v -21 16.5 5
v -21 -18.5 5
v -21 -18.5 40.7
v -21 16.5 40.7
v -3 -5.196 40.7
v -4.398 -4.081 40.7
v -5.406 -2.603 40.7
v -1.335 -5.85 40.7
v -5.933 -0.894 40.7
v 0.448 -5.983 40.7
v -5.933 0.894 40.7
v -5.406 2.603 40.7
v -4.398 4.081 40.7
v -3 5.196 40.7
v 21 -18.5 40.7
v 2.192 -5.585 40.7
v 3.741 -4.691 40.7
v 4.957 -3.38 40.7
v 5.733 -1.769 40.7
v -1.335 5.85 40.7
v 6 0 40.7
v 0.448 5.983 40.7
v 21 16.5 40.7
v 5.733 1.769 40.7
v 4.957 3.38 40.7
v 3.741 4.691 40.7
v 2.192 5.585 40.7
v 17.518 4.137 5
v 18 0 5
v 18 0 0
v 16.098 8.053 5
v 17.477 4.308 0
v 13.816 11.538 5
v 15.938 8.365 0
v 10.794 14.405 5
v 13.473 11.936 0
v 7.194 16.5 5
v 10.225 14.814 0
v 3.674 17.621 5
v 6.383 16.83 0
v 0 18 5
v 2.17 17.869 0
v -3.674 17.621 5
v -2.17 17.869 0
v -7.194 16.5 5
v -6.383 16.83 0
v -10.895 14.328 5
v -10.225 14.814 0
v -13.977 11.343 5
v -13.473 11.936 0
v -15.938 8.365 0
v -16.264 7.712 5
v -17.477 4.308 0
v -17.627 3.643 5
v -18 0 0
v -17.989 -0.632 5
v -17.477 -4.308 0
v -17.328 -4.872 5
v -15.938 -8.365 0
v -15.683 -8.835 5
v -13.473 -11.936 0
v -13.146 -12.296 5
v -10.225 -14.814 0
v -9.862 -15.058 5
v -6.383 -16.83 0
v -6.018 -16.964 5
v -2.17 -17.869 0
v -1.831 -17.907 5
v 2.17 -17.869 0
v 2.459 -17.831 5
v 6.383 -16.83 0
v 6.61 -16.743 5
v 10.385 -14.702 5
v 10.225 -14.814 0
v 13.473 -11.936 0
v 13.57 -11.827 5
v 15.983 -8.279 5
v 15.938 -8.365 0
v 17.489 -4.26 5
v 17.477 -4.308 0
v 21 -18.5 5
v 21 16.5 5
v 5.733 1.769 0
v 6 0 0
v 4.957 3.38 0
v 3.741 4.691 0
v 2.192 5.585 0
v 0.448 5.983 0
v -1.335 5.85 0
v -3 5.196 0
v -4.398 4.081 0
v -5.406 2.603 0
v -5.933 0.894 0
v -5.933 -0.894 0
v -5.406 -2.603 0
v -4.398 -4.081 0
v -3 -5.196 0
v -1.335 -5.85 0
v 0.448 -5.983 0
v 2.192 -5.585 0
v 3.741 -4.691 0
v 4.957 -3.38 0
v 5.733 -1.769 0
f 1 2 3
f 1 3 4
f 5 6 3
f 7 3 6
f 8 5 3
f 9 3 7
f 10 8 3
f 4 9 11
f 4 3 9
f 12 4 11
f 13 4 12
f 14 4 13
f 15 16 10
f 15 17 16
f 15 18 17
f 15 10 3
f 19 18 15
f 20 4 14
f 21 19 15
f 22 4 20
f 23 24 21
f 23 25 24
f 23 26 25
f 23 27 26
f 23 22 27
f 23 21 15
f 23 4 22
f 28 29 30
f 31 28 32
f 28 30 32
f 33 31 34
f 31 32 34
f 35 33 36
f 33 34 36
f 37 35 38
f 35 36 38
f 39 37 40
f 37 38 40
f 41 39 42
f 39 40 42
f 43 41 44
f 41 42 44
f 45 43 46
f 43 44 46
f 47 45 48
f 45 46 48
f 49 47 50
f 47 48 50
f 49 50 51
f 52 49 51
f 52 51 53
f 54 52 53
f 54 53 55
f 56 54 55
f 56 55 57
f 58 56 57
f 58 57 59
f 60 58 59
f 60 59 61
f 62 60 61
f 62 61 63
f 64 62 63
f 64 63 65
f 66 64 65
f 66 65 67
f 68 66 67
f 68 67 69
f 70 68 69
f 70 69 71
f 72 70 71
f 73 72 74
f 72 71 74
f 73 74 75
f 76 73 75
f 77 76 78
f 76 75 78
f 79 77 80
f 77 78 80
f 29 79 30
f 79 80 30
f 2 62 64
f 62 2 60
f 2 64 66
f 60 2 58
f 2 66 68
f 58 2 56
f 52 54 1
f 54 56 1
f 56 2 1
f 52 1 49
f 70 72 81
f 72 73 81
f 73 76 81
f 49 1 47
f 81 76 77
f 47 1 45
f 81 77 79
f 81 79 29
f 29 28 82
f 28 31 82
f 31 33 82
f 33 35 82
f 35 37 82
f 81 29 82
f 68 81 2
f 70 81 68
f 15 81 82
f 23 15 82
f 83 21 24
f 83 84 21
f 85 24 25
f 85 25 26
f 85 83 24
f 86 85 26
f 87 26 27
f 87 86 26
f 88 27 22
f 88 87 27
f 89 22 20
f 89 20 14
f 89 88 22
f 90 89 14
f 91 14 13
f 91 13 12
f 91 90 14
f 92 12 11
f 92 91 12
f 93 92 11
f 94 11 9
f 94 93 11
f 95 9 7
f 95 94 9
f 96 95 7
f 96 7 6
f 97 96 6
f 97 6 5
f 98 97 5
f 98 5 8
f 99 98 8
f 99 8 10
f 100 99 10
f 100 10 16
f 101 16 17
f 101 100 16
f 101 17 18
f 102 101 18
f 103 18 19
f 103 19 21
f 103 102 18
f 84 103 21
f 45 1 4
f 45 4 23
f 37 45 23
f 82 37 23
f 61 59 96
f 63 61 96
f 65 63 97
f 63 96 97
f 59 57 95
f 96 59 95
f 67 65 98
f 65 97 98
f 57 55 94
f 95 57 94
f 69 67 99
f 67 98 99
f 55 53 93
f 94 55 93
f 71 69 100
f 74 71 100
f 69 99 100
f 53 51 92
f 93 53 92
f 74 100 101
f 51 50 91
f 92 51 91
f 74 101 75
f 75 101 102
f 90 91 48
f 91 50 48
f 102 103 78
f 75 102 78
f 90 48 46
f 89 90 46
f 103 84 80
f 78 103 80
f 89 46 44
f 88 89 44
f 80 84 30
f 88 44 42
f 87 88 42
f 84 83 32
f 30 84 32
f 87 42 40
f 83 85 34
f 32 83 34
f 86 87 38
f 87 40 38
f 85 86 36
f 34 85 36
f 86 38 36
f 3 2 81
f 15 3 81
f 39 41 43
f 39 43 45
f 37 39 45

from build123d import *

# Parameters (mm, degrees)
SKETCH_1_R      = 18
SKETCH_1_R_2    = 6
EXTRUDE_1_DEPTH = 5
SKETCH_2_W      = 42
SKETCH_2_H      = 35
SKETCH_2_R      = 6
EXTRUDE_2_DEPTH = 35.7


with BuildPart() as part:
    # 草图1 → 凸台-拉伸1 (new body)
    with BuildSketch(Plane.XY):
        Circle(SKETCH_1_R)
        Circle(SKETCH_1_R_2, mode=Mode.SUBTRACT)
    extrude(amount=EXTRUDE_1_DEPTH)

    # 草图2 → 凸台-拉伸2 (add)
    with BuildSketch(Plane.XY.offset(5)):
        with Locations((0, -1)):
            Rectangle(SKETCH_2_W, SKETCH_2_H)
        Circle(SKETCH_2_R, mode=Mode.SUBTRACT)
    extrude(amount=EXTRUDE_2_DEPTH)


solid = part.part
